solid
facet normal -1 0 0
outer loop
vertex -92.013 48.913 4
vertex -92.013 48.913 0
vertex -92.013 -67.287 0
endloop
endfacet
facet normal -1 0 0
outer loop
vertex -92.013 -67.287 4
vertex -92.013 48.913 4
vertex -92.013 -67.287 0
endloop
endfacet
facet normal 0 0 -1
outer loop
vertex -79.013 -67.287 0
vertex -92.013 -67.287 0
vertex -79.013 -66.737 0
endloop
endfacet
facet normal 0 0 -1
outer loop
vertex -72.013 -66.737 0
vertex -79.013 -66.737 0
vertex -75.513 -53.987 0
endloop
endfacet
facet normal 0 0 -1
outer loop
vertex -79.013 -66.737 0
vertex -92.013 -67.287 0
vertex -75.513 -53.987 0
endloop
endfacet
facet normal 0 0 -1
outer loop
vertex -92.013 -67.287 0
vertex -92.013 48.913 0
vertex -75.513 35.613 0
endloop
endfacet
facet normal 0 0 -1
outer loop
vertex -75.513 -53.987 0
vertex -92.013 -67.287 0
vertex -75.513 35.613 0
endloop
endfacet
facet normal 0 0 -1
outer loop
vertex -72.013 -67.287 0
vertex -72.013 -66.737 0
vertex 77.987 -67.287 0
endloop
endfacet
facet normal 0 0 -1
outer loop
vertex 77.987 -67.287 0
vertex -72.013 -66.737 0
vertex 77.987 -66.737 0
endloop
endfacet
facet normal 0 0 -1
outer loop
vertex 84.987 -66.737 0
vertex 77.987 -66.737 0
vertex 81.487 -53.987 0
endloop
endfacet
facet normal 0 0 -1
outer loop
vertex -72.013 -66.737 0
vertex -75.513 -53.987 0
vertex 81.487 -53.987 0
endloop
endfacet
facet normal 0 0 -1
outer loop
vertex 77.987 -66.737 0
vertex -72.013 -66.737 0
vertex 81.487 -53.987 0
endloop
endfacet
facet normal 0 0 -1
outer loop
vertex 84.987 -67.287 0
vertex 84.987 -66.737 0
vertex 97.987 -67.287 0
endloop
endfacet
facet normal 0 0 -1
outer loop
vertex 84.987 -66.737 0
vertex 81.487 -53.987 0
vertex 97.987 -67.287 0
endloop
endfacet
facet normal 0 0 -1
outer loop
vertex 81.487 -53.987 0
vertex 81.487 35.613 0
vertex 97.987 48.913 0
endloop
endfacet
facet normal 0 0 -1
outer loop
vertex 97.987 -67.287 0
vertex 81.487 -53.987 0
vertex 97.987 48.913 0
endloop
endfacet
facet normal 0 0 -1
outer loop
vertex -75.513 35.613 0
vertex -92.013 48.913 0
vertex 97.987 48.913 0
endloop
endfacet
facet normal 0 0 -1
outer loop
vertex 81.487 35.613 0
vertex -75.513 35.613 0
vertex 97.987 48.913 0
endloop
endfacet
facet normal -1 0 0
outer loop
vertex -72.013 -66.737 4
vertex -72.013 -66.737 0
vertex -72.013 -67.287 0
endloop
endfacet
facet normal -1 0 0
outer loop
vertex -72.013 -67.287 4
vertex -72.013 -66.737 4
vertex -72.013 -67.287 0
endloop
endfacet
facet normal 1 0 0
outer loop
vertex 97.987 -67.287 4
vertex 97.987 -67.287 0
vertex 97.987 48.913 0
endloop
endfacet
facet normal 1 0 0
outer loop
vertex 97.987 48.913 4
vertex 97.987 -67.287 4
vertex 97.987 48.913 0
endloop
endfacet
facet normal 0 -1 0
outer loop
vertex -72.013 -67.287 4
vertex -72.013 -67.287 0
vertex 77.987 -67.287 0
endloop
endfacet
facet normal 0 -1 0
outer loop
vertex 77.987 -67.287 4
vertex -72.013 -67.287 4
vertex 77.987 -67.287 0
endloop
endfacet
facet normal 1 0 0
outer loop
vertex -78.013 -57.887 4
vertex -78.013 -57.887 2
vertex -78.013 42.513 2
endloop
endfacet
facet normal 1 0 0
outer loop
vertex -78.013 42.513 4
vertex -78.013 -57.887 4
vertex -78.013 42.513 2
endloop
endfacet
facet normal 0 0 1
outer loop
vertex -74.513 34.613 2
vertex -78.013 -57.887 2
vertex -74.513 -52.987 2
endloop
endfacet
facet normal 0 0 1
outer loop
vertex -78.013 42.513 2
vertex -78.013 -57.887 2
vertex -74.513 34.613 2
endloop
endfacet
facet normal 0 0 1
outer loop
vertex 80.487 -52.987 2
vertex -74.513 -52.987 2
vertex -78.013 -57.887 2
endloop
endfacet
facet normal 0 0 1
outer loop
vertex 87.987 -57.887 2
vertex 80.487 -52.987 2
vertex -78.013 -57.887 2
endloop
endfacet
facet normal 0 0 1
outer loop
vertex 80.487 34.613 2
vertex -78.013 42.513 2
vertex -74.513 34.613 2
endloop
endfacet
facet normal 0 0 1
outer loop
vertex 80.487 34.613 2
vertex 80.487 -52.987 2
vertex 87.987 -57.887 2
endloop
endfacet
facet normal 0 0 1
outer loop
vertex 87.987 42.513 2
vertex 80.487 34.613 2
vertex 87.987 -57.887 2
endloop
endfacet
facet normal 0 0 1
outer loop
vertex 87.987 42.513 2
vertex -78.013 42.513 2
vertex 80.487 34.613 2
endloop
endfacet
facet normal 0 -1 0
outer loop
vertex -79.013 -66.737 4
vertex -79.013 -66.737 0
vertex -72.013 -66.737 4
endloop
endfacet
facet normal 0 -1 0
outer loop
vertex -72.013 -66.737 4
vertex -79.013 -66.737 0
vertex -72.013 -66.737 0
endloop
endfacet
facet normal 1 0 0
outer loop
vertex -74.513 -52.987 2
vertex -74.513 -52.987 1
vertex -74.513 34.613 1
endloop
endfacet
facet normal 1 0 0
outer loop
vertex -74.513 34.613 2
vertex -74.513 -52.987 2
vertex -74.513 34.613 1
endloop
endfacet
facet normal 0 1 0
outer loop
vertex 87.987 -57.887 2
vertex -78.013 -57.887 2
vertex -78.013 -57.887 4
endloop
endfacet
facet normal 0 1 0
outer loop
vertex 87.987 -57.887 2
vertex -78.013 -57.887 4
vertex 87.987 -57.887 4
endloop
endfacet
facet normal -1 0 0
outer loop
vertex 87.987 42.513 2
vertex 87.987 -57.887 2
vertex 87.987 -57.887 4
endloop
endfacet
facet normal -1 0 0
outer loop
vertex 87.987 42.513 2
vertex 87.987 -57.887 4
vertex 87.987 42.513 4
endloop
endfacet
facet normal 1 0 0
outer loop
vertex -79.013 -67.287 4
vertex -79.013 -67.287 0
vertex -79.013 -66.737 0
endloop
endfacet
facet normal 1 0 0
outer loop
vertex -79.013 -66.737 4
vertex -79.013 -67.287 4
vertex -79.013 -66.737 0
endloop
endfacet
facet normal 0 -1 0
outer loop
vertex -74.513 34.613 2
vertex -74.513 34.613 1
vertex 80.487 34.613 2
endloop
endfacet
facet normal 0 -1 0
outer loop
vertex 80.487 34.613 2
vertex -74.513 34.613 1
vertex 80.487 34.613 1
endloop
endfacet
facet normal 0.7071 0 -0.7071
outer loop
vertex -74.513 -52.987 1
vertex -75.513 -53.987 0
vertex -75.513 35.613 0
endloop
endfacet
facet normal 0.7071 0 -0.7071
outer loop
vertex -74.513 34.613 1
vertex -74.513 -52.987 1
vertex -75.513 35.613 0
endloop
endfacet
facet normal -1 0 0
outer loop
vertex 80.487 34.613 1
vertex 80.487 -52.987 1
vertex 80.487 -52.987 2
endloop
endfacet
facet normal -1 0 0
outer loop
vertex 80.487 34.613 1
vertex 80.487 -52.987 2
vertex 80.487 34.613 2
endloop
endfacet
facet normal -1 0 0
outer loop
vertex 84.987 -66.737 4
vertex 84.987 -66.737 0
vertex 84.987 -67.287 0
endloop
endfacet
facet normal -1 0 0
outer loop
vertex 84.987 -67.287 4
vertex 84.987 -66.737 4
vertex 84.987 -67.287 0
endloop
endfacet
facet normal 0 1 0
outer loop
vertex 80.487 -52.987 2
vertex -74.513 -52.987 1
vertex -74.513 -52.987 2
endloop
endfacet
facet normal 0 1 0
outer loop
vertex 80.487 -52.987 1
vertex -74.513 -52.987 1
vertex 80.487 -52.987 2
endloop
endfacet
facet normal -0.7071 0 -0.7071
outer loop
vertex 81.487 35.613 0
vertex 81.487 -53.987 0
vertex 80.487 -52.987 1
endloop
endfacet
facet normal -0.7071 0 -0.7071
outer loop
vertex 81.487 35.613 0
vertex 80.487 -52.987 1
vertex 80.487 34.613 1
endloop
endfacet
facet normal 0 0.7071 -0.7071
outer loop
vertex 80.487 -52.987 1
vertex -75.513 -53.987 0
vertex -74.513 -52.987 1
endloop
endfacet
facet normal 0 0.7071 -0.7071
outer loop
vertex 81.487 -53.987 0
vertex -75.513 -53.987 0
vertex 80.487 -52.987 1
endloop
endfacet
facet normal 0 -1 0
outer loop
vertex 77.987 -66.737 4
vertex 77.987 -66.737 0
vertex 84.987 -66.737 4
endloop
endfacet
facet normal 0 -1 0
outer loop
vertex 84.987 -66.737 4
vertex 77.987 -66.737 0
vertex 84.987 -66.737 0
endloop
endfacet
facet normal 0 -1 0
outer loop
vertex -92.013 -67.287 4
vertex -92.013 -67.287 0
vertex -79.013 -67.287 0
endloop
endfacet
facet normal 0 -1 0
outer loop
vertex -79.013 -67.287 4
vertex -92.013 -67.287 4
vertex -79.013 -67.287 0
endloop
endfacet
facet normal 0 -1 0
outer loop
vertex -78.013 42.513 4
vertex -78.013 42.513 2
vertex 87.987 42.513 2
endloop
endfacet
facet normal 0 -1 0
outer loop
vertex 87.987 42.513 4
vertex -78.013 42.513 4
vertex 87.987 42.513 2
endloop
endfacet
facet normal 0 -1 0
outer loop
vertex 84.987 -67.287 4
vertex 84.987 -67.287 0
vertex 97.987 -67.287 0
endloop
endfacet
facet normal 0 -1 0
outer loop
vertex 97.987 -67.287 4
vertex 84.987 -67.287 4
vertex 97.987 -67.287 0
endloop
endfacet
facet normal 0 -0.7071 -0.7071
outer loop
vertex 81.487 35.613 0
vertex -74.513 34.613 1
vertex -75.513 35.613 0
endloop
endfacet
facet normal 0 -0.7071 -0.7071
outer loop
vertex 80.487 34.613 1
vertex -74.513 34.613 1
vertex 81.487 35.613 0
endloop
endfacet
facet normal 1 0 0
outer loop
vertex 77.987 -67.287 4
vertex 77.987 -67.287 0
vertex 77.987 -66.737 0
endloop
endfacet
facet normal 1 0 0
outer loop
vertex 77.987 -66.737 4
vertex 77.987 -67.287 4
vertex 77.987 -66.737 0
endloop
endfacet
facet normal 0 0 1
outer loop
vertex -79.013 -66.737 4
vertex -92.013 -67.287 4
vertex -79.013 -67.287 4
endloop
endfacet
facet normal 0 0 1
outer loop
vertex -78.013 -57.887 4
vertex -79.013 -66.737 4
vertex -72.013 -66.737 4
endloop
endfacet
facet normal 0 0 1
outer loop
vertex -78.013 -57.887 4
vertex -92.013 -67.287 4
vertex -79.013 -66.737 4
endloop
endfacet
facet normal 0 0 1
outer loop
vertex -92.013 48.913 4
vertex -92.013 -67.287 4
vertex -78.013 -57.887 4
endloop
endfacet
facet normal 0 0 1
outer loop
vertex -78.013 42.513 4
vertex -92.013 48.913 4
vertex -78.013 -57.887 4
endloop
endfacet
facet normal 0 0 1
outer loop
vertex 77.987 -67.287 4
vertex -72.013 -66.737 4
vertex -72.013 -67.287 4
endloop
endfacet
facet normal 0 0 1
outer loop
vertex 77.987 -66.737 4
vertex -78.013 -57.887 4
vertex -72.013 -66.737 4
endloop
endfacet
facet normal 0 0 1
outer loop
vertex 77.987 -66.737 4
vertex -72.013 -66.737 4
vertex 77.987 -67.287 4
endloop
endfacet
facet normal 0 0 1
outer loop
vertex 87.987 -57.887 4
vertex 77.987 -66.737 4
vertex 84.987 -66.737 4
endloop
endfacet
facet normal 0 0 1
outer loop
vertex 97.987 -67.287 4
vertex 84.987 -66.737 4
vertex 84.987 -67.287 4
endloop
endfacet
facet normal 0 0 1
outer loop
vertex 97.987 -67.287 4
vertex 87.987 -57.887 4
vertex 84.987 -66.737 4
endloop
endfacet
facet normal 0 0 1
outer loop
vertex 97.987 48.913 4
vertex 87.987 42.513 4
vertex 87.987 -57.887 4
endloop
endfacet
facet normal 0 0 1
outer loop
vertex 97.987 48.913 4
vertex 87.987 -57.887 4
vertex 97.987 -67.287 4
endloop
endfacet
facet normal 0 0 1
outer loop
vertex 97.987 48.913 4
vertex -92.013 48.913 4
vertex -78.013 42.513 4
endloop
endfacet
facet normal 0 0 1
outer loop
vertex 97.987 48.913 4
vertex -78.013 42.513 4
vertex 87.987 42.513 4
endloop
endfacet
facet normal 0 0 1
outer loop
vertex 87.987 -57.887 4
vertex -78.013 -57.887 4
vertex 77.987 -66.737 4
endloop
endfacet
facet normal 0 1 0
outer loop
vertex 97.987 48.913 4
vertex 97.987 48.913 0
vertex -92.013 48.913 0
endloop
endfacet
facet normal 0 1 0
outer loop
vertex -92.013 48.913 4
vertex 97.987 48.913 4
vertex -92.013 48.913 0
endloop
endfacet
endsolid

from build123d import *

# Parameters (mm, degrees)
F0_W     = 166
F0_H     = 100.4
F1_DEPTH = 4
F0_W_2   = 155
F0_H_2   = 87.6
F2_DEPTH = 2
F3_SIZE  = 1


with BuildPart() as f1:
    # F0 (on Top) → F1 (new body)
    with BuildSketch(Plane.XY):
        Polygon((97.986992, 48.91296), (-92.013008, 48.91296), (-92.013008, -67.28704), (-79.013008, -67.28704), (-79.013008, -66.73704), (-72.013008, -66.73704), (-72.013008, -67.28704), (77.986992, -67.28704), (77.986992, -66.73704), (84.986992, -66.73704), (84.986992, -67.28704), (97.986992, -67.28704), align=None)
        with Locations((4.986992, -7.68704)):
            Rectangle(F0_W, F0_H, mode=Mode.SUBTRACT)
    extrude(amount=F1_DEPTH)

    # F0 (on Top) → F2 (join)
    with BuildSketch(Plane.XY):
        with Locations((4.986992, -7.68704)):
            Rectangle(F0_W, F0_H)
        with Locations((2.986992, -9.18704)):
            Rectangle(F0_W_2, F0_H_2, mode=Mode.SUBTRACT)
    extrude(amount=F2_DEPTH)

    # F3
    f3_edges = [f1.edges().sort_by_distance(p)[0] for p in [
        (2.986992, -52.98704, 0),
        (-74.513008, -9.18704, 0),
        (2.986992, 34.61296, 0),
        (80.486992, -9.18704, 0),
    ]]
    chamfer(f3_edges, length=F3_SIZE)


solid = f1.part
